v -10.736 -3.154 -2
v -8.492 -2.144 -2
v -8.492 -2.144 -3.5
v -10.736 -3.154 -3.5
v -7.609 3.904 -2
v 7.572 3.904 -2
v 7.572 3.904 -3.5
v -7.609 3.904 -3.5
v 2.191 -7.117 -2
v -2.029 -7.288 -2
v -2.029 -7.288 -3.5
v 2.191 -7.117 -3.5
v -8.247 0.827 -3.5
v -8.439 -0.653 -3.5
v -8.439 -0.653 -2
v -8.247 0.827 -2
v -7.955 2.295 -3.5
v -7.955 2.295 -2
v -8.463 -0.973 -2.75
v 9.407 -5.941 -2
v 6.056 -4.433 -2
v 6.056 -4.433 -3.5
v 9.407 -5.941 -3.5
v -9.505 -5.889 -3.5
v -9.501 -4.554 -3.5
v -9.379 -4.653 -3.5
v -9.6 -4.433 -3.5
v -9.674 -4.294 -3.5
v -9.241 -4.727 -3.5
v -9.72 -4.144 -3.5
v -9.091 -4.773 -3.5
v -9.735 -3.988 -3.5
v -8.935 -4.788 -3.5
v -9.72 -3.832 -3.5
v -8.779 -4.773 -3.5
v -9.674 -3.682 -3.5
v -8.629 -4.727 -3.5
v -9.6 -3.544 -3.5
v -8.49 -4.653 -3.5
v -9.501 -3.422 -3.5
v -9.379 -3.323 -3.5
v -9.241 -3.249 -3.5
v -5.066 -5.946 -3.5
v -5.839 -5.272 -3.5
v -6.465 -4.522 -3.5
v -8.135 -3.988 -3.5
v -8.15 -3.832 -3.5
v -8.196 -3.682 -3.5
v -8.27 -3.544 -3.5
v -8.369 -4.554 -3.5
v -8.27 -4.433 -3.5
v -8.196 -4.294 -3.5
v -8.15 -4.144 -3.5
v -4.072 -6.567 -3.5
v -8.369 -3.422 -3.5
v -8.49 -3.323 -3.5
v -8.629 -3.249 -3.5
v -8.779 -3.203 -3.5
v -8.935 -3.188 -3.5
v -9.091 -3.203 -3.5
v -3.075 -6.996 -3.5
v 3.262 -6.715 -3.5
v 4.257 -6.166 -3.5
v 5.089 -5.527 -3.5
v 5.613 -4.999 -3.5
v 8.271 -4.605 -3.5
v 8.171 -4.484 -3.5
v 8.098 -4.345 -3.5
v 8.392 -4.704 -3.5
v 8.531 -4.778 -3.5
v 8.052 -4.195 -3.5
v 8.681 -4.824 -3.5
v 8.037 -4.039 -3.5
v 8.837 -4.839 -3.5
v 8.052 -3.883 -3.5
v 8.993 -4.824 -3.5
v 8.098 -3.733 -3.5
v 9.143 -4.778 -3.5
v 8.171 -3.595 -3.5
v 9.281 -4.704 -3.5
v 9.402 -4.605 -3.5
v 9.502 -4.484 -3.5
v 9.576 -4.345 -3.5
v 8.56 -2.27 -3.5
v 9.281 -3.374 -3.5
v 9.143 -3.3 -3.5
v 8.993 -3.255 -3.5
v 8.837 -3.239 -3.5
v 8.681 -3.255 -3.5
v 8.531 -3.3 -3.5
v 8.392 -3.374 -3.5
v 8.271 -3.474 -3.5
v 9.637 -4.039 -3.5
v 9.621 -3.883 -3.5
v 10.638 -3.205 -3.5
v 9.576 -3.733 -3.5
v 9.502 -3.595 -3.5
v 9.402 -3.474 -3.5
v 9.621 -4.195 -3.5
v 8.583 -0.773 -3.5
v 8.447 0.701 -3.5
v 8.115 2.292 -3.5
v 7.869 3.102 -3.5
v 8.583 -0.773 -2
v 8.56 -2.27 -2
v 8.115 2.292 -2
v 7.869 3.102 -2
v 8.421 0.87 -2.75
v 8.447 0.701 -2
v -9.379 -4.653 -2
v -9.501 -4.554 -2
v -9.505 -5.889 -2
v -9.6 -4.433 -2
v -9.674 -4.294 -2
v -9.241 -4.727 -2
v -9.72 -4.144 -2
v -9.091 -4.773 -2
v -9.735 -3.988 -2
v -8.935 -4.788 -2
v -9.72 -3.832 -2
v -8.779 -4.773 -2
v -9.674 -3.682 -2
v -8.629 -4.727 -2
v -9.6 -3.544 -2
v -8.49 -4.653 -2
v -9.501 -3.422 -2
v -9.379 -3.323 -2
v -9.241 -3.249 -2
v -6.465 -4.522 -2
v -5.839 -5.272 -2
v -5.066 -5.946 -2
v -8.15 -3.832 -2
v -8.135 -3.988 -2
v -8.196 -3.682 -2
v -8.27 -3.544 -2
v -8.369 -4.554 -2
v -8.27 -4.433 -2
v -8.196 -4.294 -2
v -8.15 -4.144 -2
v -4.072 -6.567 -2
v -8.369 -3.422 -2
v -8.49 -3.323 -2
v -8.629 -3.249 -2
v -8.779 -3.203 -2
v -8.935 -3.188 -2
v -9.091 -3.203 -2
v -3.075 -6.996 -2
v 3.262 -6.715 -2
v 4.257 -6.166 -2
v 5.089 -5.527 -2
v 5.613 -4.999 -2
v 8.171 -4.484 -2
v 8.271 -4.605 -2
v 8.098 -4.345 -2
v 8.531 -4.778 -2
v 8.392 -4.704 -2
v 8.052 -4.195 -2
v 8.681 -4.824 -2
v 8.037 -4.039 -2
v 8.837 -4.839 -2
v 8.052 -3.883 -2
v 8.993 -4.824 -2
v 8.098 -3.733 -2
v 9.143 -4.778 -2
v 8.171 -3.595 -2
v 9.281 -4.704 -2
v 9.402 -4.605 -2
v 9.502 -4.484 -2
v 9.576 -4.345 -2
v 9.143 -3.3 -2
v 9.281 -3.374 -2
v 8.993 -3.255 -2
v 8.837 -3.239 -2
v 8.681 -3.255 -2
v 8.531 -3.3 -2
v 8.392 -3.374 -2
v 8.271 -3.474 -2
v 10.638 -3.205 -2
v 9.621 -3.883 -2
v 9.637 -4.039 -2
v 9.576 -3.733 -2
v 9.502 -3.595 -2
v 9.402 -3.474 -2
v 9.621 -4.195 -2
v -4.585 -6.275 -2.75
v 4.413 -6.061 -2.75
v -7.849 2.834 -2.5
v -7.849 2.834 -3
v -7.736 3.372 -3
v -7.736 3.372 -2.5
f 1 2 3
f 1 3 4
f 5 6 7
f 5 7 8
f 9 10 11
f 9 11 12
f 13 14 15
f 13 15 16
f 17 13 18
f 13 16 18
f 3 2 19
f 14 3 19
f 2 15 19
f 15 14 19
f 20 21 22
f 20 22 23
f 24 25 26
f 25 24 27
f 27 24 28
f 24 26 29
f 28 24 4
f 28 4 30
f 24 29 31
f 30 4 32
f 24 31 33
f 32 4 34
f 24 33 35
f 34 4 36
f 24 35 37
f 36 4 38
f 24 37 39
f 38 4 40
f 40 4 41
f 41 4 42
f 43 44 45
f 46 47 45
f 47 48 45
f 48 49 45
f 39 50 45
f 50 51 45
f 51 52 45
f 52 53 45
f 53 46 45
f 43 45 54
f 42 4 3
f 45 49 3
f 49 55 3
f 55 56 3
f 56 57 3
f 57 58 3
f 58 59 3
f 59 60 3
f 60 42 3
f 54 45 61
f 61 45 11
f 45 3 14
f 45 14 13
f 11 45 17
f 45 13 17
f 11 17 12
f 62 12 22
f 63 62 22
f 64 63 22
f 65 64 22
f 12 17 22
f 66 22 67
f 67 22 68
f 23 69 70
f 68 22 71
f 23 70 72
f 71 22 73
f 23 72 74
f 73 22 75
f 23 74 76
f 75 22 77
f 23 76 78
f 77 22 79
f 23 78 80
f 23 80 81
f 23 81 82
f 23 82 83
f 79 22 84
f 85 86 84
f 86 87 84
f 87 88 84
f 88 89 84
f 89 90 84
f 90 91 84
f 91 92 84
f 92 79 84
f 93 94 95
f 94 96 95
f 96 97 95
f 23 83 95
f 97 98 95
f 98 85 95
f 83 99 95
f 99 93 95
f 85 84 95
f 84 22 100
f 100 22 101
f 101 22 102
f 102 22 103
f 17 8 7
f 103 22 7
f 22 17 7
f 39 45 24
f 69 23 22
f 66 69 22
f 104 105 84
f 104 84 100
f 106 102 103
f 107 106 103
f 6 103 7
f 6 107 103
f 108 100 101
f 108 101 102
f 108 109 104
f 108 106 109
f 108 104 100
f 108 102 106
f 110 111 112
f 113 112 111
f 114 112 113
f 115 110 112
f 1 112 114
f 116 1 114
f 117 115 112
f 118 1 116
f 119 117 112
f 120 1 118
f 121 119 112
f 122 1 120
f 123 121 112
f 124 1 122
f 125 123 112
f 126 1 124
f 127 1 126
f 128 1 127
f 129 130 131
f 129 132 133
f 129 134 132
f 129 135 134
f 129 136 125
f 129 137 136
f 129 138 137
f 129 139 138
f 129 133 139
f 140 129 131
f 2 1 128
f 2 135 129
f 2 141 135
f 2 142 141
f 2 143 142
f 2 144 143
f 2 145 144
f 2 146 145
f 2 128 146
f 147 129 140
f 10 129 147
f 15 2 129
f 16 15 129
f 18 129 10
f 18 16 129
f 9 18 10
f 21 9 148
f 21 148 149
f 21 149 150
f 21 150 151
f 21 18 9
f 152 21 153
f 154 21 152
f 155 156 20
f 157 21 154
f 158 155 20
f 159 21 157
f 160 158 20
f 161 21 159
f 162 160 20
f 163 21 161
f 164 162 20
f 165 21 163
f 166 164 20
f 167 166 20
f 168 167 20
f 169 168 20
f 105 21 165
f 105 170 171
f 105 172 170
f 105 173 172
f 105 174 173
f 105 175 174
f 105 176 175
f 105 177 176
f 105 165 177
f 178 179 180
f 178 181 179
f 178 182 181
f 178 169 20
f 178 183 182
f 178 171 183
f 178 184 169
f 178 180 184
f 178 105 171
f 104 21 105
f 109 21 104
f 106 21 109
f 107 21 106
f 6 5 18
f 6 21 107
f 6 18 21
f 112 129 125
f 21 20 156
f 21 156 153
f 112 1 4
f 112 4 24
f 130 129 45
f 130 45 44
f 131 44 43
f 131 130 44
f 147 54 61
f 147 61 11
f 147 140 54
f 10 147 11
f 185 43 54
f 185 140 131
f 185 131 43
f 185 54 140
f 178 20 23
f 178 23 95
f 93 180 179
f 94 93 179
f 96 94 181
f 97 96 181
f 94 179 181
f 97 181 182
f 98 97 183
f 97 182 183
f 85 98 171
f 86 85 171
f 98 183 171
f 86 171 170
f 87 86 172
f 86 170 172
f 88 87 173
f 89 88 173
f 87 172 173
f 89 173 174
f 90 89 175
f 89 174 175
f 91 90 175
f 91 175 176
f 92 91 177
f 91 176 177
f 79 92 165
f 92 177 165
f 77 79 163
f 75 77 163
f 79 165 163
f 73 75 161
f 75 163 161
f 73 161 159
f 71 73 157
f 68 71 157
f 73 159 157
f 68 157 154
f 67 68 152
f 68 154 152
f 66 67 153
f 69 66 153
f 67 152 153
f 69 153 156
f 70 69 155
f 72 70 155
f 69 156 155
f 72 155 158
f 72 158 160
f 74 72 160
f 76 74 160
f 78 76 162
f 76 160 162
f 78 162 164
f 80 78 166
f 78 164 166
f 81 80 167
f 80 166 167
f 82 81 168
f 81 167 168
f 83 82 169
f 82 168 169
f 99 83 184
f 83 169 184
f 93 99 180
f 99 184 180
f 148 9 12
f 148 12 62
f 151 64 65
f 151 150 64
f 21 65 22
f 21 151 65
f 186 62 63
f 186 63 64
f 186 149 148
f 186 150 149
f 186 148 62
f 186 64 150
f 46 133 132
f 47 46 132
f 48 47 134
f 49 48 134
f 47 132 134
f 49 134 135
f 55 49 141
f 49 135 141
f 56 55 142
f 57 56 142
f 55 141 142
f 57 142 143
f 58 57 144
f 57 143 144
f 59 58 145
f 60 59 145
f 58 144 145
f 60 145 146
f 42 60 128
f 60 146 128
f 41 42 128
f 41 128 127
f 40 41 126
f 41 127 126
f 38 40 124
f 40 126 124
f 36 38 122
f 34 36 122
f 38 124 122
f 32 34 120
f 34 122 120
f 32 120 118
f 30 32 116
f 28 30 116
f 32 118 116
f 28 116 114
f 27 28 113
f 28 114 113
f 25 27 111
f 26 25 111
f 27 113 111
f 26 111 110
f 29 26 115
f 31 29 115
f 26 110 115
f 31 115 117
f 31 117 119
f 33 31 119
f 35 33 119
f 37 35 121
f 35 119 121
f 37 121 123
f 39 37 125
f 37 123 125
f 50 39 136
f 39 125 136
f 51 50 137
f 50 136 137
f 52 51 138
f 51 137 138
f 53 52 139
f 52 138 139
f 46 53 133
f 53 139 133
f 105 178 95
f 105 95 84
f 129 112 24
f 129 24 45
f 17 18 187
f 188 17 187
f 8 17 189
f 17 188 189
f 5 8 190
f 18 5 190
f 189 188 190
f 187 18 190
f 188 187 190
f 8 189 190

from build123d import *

# Parameters (mm, degrees)
BOSS_EXTRUDE1_START = -2
SKETCH1_R           = 0.8
BOSS_EXTRUDE1_DEPTH = 1.5


with BuildPart() as part:
    # Sketch1 → Boss-Extrude1 (new body)
    with BuildSketch(Plane.XY.offset(BOSS_EXTRUDE1_START)):
        with BuildLine():
            Line((7.571676853, 3.903865442), (6.416086079, 3.903865442))
            Line((6.416086079, 3.903865442), (-6.281037731, 3.903865442))
            Line((-6.281037731, 3.903865442), (-7.609270418, 3.903865442))
            add(Edge.make_bspline(
                [(-7.95528082, 2.295104415), (-7.850615408, 2.833585734), (-7.745718452, 3.376152559), (-7.609270418, 3.903865442)],
                knots=[0.598753878, 0.598753878, 0.598753878, 0.598753878, 0.708182049, 0.708182049, 0.708182049, 0.708182049], degree=3))
            add(Edge.make_bspline(
                [(-8.491604222, -2.143861632), (-8.497541628, -1.753055168), (-8.461188827, -0.260180468), (-8.197652692, 1.215784612), (-7.95528082, 2.295104415)],
                knots=[0.5931491, 0.5931491, 0.5931491, 0.5931491, 0.658813679, 0.84412355, 0.84412355, 0.84412355, 0.84412355], degree=3))
            Line((-8.491604222, -2.143861632), (-10.735900357, -3.15355335))
            Line((-10.735900357, -3.15355335), (-9.505051186, -5.889428039))
            Line((-9.505051186, -5.889428039), (-6.464679246, -4.521557259))
            add(Edge.make_bspline(
                [(-6.464679246, -4.521557259), (-4.951547414, -6.675350117), (-2.029321492, -7.287998666)],
                knots=[0.510655247, 0.510655247, 0.510655247, 1.302217681, 1.302217681, 1.302217681], degree=2, weights=[1, 0.922695664, 1]))
            Line((-2.029321492, -7.287998666), (2.191128147, -7.117218369))
            add(Edge.make_bspline(
                [(2.191128147, -7.117218369), (4.720940331, -6.365516028), (6.056108453, -4.433151977)],
                knots=[1.895445663, 1.895445663, 1.895445663, 2.606320009, 2.606320009, 2.606320009], degree=2, weights=[1, 0.937494442, 1]))
            Line((6.056108453, -4.433151977), (9.406785059, -5.940595847))
            Line((9.406785059, -5.940595847), (10.637634232, -3.204721158))
            Line((10.637634232, -3.204721158), (8.560362384, -2.270172384))
            add(Edge.make_bspline(
                [(8.560362384, -2.270172384), (8.775779374, 0.923139429), (7.571676853, 3.903865442)],
                knots=[0, 0, 0, 1, 1, 1], degree=2))
        make_face()
        with Locations((8.836663947, -4.039290527)):
            Circle(SKETCH1_R, mode=Mode.SUBTRACT)
        with Locations((-8.934930071, -3.988122724)):
            Circle(SKETCH1_R, mode=Mode.SUBTRACT)
    extrude(amount=-BOSS_EXTRUDE1_DEPTH)


solid = part.part
